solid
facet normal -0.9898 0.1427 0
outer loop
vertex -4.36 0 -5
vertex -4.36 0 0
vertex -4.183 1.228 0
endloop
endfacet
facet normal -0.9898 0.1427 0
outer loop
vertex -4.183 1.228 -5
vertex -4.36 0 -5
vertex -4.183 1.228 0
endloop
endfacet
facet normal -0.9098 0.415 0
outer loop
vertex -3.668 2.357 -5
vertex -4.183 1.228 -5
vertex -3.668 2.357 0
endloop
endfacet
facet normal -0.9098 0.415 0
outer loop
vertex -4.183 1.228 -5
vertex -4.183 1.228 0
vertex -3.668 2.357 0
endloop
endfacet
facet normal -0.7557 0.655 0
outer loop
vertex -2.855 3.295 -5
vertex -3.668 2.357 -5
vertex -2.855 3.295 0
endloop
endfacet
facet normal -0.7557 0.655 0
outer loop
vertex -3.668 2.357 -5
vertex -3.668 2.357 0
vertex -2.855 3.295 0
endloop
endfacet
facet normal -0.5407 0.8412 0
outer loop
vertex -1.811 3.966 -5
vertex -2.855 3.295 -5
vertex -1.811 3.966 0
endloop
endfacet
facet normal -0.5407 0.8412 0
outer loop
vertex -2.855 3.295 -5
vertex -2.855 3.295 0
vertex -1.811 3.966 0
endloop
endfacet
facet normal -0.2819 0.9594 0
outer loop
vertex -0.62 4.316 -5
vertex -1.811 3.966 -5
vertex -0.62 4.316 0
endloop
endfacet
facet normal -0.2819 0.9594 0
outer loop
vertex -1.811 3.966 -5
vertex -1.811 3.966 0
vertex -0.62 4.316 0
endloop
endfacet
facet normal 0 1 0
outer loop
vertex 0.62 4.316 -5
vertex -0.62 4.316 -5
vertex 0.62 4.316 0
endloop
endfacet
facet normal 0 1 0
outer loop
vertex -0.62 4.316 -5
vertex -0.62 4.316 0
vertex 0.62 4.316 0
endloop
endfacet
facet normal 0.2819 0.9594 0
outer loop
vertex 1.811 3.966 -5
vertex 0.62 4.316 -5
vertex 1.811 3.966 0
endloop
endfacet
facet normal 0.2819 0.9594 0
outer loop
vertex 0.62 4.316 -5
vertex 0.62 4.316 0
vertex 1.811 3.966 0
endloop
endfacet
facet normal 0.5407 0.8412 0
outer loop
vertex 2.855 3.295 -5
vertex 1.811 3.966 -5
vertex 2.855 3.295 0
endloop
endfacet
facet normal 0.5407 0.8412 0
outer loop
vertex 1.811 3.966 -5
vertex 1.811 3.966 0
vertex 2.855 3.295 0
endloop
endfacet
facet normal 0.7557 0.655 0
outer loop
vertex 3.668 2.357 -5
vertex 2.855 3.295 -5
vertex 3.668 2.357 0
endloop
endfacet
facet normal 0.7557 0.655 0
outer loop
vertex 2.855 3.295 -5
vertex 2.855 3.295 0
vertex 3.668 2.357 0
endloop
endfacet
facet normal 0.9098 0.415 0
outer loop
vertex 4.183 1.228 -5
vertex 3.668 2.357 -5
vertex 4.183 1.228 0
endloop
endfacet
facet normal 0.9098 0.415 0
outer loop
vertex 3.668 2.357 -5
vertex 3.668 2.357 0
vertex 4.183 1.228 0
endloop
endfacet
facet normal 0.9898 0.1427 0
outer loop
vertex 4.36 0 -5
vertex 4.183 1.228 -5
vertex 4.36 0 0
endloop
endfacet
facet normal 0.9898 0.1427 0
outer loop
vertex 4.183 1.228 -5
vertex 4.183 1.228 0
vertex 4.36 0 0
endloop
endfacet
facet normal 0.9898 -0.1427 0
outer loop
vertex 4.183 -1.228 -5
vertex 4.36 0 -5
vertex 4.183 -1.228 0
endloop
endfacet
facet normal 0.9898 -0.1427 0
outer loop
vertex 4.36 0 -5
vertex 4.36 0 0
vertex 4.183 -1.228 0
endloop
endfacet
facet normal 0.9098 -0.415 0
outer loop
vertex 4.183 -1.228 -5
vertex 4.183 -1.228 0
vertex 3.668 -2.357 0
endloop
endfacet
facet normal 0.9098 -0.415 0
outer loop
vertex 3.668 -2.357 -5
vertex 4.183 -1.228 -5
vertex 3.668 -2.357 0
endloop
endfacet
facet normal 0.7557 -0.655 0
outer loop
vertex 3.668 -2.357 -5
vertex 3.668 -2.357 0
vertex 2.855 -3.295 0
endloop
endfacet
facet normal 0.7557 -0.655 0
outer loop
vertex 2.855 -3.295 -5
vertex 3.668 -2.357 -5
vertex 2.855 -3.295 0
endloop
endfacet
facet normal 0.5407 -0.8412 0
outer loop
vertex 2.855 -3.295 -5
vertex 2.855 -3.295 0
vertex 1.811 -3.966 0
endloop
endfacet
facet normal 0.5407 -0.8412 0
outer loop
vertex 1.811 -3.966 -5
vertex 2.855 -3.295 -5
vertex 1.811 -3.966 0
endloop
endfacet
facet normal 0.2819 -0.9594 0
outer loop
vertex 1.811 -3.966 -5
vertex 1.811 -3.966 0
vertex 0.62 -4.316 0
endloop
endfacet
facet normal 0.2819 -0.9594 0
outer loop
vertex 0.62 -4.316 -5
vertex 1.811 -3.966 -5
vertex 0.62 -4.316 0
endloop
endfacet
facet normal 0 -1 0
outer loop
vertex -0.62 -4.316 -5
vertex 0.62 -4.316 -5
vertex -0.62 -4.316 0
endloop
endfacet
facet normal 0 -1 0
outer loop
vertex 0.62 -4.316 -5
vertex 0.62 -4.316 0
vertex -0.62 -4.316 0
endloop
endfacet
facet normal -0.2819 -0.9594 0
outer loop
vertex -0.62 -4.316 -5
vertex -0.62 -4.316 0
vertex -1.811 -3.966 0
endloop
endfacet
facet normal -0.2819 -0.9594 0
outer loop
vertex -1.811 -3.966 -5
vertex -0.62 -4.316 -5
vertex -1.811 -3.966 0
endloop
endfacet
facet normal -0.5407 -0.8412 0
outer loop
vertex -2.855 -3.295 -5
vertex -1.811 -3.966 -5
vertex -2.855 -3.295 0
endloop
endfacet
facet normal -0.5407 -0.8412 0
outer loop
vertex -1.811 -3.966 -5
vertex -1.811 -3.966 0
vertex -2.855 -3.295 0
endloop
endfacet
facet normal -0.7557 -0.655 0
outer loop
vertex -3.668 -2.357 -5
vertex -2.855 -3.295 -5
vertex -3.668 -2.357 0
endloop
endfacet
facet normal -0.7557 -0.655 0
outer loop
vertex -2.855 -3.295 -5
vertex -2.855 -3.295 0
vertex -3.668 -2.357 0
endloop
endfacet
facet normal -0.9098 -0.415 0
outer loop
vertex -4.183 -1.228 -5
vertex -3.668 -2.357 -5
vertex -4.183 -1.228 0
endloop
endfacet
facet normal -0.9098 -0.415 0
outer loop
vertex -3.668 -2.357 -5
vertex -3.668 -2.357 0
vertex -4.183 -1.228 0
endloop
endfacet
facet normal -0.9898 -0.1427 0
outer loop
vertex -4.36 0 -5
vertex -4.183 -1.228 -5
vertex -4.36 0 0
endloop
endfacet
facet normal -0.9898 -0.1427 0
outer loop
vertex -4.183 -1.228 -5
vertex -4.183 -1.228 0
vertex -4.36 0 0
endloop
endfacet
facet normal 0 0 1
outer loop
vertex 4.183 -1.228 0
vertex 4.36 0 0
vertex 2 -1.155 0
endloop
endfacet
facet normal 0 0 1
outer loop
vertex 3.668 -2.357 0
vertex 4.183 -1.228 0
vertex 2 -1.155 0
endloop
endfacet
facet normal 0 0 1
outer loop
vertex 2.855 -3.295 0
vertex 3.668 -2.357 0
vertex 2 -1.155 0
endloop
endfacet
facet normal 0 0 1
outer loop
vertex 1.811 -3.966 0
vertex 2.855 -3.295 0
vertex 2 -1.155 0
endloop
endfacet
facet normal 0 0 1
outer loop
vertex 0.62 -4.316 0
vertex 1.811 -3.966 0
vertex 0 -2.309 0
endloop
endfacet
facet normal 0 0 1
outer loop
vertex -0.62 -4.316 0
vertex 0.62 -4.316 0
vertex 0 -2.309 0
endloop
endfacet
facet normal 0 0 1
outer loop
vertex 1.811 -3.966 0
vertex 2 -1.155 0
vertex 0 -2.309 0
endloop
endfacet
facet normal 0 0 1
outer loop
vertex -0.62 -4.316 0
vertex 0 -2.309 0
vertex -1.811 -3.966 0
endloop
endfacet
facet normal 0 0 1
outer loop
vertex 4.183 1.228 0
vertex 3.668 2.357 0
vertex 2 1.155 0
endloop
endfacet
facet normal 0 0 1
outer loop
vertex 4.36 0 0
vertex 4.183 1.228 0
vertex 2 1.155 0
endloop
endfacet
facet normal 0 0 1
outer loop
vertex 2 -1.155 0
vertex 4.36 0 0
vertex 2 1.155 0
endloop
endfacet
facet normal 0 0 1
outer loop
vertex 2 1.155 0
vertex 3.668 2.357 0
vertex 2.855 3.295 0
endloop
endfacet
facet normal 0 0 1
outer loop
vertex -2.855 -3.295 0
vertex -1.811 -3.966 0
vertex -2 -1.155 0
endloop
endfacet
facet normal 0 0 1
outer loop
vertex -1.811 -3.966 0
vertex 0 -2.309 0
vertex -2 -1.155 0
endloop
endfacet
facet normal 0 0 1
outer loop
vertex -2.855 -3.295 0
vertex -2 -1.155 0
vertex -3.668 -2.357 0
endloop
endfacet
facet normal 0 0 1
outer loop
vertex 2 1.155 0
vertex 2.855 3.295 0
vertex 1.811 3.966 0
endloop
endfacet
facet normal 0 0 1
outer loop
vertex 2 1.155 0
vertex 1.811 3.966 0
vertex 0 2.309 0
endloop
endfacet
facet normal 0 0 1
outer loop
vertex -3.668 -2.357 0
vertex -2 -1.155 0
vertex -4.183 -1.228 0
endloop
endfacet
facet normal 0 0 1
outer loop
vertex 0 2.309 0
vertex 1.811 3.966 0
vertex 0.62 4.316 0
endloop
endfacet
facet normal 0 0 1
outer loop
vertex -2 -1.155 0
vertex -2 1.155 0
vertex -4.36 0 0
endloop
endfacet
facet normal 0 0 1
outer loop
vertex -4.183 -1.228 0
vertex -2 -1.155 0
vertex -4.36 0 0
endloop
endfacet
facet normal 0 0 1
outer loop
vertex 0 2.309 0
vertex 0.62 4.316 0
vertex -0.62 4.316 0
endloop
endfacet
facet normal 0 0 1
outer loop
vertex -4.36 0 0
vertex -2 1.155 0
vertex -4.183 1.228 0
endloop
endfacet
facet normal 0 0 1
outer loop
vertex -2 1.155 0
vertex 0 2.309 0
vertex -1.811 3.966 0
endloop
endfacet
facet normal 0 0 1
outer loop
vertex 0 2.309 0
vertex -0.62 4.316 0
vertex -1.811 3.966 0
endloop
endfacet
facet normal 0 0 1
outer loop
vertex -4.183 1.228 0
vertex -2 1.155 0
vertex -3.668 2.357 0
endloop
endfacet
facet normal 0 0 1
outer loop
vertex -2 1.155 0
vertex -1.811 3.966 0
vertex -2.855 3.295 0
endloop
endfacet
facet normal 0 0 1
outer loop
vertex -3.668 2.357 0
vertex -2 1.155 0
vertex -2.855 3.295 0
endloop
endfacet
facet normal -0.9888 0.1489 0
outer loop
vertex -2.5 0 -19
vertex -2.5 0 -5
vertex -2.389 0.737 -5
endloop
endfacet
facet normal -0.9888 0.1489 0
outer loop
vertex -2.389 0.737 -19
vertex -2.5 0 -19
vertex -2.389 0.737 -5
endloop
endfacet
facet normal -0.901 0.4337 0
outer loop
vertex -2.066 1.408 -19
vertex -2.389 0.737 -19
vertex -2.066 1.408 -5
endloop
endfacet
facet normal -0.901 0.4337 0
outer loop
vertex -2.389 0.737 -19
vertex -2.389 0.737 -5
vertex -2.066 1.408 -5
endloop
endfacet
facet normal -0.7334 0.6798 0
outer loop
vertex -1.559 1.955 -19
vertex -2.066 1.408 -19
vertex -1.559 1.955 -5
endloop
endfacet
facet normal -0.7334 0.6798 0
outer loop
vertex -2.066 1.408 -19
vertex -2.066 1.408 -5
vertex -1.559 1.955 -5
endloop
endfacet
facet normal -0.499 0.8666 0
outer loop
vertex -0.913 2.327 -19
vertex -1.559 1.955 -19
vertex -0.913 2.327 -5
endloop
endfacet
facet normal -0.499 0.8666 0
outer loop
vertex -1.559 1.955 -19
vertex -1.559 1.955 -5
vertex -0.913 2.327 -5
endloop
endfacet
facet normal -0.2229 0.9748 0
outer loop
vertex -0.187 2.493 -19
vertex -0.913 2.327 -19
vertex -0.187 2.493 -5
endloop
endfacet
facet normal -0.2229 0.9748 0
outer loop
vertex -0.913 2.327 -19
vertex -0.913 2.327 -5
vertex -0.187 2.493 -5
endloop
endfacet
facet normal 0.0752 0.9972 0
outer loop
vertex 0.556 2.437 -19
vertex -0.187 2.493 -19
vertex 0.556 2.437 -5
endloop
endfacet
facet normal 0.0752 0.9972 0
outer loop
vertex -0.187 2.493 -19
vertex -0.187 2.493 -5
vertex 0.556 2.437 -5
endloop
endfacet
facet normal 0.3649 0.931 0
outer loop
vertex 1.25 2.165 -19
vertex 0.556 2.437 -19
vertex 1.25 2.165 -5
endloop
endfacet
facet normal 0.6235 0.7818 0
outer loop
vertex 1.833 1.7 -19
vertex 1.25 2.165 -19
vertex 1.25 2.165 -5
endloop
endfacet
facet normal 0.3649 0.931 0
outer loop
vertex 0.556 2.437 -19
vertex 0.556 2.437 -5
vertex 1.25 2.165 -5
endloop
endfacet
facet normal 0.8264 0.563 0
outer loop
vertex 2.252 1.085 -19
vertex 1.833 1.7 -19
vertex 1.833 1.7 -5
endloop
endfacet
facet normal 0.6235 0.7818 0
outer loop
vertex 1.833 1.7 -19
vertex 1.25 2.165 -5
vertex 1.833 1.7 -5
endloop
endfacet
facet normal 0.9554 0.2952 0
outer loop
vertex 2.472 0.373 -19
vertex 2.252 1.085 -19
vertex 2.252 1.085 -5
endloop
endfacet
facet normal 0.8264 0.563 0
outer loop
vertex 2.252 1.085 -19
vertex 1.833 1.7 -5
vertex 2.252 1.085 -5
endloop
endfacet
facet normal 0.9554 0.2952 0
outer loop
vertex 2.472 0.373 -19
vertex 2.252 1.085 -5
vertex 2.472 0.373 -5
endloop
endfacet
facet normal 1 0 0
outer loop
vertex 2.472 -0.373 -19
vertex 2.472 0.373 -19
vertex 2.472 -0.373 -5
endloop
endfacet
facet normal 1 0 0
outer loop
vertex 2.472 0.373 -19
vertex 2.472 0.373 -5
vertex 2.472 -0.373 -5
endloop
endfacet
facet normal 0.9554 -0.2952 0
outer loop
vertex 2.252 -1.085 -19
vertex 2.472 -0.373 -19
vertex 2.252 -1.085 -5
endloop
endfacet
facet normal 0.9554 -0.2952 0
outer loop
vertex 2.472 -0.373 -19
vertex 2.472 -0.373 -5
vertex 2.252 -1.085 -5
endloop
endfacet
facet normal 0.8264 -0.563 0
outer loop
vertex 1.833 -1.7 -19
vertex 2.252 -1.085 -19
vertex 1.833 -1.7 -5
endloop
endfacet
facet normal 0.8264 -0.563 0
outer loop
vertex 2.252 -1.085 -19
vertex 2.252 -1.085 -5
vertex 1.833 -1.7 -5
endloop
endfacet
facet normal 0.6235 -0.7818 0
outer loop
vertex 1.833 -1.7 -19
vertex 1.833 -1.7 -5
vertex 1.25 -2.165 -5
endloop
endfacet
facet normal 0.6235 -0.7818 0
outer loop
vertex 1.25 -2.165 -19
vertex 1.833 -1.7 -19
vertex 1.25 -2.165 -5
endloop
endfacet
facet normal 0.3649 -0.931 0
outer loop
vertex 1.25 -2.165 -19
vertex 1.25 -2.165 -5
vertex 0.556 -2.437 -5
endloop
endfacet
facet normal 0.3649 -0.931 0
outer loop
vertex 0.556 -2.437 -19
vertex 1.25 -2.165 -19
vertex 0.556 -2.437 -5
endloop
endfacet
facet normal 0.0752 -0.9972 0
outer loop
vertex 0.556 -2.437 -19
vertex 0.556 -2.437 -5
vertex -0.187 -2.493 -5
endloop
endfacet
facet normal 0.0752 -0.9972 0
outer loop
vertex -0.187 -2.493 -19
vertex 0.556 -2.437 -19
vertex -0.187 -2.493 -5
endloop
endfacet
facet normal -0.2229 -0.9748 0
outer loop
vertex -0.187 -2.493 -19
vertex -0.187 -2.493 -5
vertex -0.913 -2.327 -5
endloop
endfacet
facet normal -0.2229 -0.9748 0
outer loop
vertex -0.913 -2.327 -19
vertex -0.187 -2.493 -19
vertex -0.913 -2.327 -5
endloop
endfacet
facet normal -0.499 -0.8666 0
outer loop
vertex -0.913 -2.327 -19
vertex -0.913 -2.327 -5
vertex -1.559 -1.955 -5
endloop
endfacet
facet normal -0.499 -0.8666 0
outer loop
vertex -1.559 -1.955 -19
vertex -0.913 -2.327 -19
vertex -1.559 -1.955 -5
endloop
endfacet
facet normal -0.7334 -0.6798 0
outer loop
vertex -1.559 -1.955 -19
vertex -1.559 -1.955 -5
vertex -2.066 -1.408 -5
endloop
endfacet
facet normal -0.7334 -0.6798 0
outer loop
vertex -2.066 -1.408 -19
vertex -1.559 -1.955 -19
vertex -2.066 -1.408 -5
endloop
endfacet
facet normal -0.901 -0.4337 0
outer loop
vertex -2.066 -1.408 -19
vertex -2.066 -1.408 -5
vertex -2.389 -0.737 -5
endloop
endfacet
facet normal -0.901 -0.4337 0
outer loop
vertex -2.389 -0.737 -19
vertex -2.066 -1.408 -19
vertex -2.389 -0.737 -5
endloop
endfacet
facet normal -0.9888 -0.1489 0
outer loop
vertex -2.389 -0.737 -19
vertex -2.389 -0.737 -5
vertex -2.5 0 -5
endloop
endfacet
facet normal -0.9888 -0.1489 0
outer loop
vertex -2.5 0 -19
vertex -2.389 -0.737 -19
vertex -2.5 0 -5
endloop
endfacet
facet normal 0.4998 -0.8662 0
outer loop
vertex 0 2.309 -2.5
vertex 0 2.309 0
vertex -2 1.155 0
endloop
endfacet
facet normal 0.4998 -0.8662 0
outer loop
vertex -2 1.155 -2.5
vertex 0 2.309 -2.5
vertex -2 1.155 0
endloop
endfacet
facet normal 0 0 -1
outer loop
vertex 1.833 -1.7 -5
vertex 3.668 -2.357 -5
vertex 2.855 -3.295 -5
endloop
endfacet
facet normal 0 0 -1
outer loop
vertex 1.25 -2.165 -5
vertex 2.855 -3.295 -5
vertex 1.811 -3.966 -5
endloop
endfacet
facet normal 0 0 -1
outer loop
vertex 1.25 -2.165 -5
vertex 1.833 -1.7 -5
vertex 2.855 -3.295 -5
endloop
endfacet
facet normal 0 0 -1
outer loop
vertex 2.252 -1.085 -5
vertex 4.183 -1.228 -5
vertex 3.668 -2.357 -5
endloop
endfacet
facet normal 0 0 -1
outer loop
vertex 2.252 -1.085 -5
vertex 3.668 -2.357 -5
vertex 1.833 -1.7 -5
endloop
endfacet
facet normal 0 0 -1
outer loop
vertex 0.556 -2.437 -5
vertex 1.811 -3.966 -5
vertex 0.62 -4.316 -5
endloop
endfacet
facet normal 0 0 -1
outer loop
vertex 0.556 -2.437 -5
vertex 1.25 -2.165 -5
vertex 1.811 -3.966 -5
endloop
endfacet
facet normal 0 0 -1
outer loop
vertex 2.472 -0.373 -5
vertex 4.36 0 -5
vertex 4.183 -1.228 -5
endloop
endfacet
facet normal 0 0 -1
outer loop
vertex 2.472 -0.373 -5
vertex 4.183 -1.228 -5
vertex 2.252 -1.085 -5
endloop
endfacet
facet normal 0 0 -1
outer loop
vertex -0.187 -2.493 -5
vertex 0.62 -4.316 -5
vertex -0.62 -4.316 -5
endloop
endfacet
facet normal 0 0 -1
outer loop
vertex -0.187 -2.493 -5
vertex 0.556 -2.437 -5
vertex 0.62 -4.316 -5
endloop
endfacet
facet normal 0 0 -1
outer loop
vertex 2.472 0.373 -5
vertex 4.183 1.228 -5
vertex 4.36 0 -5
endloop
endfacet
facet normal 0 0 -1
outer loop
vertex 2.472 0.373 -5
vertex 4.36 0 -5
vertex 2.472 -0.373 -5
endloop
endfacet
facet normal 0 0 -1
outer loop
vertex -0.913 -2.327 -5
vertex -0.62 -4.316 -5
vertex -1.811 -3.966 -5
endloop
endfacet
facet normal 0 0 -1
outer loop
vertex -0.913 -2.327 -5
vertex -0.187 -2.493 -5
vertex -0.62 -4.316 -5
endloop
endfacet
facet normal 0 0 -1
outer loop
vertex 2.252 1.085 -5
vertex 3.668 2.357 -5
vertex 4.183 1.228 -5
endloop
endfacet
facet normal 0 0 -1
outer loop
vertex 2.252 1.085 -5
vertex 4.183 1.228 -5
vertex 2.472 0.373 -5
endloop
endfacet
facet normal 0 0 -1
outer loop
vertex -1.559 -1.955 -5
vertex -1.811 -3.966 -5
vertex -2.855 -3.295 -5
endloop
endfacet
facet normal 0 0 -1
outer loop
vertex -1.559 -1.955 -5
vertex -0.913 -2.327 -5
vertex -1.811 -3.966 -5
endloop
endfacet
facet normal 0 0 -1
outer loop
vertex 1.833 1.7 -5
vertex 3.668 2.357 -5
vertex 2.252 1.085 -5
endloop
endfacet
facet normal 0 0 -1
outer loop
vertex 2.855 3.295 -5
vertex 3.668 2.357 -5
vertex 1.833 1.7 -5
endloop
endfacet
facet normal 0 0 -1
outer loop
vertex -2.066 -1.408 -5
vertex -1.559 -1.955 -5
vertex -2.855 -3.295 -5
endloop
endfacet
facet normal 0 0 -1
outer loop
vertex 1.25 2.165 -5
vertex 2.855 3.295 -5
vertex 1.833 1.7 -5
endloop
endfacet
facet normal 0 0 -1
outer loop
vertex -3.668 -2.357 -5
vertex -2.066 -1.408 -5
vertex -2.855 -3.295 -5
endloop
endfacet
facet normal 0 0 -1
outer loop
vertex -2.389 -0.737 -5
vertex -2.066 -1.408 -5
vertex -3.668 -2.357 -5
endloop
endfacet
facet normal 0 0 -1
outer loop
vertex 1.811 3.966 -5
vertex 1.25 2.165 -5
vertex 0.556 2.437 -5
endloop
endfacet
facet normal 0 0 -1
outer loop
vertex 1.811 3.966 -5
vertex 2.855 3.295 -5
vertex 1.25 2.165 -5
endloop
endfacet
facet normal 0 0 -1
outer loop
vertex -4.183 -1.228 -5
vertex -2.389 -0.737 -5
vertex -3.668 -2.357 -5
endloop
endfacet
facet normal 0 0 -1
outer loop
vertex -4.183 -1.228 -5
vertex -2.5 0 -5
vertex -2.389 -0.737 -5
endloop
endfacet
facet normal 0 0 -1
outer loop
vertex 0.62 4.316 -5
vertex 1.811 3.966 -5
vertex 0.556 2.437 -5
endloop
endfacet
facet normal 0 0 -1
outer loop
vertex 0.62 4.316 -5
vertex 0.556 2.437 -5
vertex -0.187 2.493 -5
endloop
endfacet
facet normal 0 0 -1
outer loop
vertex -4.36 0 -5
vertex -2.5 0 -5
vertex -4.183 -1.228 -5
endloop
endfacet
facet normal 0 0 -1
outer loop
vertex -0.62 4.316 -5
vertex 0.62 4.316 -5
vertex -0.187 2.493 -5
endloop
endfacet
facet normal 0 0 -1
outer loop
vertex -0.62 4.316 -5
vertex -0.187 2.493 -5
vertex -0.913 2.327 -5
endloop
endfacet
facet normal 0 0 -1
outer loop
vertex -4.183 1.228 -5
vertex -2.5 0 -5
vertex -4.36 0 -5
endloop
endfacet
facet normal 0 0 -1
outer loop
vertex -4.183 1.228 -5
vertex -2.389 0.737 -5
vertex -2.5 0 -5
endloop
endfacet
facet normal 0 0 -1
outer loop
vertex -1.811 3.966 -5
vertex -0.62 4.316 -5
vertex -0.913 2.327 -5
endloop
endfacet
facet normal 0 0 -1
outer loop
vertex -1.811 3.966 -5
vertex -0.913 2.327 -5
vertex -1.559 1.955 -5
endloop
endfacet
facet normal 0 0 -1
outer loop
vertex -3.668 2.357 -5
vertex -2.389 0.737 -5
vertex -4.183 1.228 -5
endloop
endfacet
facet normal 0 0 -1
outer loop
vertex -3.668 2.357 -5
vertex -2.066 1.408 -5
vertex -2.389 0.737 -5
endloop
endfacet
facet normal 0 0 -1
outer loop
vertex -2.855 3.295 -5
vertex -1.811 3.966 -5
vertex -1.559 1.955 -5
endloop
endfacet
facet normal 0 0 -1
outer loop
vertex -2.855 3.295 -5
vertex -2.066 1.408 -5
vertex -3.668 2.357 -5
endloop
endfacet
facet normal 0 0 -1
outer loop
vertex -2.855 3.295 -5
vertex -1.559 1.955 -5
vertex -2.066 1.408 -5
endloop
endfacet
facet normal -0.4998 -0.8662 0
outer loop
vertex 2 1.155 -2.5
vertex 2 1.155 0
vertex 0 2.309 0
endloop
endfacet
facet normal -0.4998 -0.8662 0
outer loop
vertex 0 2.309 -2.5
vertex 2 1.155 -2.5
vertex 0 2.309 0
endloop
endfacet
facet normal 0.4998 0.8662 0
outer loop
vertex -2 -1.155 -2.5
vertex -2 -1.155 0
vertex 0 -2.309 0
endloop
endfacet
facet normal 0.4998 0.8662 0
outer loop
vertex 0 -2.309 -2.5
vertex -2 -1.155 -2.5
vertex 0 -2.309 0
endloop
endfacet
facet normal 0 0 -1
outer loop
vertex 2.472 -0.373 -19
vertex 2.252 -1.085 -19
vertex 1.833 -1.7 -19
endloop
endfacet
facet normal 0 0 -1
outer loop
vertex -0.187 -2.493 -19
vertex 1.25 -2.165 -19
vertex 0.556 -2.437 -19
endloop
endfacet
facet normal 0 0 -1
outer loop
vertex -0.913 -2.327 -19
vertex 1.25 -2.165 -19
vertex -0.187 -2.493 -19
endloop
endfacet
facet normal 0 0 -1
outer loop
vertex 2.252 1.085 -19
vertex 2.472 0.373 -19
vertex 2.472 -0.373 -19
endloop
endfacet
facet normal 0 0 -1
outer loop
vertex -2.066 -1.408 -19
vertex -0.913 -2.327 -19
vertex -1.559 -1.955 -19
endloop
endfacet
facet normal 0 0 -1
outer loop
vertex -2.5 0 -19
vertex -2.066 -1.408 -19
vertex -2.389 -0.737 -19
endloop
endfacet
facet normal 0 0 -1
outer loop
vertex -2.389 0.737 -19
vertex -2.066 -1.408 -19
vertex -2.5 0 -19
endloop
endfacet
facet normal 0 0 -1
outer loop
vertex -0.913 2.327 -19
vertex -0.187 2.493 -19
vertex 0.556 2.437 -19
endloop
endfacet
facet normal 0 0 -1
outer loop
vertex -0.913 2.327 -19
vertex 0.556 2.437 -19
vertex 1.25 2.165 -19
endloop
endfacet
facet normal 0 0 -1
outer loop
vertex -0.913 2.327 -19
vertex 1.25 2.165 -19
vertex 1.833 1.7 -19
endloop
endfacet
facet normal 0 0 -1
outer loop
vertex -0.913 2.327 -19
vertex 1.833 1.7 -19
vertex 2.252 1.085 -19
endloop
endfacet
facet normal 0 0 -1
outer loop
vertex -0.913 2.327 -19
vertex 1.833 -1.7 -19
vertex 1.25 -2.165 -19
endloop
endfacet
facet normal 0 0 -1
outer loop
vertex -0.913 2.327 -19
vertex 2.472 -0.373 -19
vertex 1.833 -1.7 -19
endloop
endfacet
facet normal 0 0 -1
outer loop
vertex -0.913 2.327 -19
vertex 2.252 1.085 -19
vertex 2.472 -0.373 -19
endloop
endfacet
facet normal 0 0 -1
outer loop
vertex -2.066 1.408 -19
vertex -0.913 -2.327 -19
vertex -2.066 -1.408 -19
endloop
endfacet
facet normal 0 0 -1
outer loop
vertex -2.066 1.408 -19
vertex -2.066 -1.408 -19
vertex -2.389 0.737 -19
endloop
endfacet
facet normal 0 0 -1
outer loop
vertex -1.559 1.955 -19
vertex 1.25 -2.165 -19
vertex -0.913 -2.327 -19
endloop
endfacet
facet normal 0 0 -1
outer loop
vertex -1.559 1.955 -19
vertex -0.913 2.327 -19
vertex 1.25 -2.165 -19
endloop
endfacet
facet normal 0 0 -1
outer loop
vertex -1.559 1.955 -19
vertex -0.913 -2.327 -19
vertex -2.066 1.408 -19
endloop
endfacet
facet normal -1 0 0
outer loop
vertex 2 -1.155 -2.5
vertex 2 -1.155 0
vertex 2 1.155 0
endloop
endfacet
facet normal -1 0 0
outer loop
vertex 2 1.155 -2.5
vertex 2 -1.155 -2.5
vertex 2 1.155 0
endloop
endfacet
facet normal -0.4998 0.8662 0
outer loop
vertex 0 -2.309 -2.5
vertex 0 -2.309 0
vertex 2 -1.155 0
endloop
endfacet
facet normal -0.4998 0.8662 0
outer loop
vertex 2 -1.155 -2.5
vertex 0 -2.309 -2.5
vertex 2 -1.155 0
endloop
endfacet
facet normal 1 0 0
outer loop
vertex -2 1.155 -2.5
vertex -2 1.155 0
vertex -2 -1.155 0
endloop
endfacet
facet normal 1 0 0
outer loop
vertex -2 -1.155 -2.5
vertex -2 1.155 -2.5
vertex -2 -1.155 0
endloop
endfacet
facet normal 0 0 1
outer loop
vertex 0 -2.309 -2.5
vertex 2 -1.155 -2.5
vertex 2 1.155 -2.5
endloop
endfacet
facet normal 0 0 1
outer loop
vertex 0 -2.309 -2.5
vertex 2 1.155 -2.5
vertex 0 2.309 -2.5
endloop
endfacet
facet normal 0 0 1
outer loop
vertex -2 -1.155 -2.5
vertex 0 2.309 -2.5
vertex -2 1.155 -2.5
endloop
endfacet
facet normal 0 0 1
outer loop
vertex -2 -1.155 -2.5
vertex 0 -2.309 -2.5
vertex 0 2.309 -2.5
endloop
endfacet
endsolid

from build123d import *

# Parameters (mm, degrees)
CYLINDER013_R                      = 2.5
CYLINDER013_DEPTH                  = 19
CYLINDER012_R                      = 4.36
CYLINDER012_DEPTH                  = 5
FUSION001018017017_PLACEMENT_ANGLE = 180
POCKET002018_DEPTH                 = 2.5


with BuildPart() as cylinder013:
    # Cylinder013 → Cylinder013 (new body)
    with BuildSketch(Plane.XY):
        Circle(CYLINDER013_R)
    extrude(amount=CYLINDER013_DEPTH)


with BuildPart() as zylinderkopfschraube_m5x14_isk:
    # Cylinder012 → Cylinder012 (new body)
    with BuildSketch(Plane.XY):
        Circle(CYLINDER012_R)
    extrude(amount=CYLINDER012_DEPTH)

    # Fusion001018017017: union Cylinder013
    add(cylinder013.part)


with BuildPart() as zylinderkopfschraube_m5x14_isk_1:
    # Fusion001018017017 placement: moved
    add(zylinderkopfschraube_m5x14_isk.part.rotate(Axis((0, 0, 0), (0, 1, 0)), FUSION001018017017_PLACEMENT_ANGLE))

    # Sketch019 → Pocket002018 (cut)
    with BuildSketch(Plane(origin=(0, 0, 0), x_dir=(-1, 0, 0), z_dir=(0, 0, 1))):
        Polygon((2, -1.154701), (2, 1.154701), (0, 2.309401), (-2, 1.154701), (-2, -1.154701), (0, -2.309401), align=None)
    extrude(amount=-POCKET002018_DEPTH, mode=Mode.SUBTRACT)


solid = zylinderkopfschraube_m5x14_isk_1.part
